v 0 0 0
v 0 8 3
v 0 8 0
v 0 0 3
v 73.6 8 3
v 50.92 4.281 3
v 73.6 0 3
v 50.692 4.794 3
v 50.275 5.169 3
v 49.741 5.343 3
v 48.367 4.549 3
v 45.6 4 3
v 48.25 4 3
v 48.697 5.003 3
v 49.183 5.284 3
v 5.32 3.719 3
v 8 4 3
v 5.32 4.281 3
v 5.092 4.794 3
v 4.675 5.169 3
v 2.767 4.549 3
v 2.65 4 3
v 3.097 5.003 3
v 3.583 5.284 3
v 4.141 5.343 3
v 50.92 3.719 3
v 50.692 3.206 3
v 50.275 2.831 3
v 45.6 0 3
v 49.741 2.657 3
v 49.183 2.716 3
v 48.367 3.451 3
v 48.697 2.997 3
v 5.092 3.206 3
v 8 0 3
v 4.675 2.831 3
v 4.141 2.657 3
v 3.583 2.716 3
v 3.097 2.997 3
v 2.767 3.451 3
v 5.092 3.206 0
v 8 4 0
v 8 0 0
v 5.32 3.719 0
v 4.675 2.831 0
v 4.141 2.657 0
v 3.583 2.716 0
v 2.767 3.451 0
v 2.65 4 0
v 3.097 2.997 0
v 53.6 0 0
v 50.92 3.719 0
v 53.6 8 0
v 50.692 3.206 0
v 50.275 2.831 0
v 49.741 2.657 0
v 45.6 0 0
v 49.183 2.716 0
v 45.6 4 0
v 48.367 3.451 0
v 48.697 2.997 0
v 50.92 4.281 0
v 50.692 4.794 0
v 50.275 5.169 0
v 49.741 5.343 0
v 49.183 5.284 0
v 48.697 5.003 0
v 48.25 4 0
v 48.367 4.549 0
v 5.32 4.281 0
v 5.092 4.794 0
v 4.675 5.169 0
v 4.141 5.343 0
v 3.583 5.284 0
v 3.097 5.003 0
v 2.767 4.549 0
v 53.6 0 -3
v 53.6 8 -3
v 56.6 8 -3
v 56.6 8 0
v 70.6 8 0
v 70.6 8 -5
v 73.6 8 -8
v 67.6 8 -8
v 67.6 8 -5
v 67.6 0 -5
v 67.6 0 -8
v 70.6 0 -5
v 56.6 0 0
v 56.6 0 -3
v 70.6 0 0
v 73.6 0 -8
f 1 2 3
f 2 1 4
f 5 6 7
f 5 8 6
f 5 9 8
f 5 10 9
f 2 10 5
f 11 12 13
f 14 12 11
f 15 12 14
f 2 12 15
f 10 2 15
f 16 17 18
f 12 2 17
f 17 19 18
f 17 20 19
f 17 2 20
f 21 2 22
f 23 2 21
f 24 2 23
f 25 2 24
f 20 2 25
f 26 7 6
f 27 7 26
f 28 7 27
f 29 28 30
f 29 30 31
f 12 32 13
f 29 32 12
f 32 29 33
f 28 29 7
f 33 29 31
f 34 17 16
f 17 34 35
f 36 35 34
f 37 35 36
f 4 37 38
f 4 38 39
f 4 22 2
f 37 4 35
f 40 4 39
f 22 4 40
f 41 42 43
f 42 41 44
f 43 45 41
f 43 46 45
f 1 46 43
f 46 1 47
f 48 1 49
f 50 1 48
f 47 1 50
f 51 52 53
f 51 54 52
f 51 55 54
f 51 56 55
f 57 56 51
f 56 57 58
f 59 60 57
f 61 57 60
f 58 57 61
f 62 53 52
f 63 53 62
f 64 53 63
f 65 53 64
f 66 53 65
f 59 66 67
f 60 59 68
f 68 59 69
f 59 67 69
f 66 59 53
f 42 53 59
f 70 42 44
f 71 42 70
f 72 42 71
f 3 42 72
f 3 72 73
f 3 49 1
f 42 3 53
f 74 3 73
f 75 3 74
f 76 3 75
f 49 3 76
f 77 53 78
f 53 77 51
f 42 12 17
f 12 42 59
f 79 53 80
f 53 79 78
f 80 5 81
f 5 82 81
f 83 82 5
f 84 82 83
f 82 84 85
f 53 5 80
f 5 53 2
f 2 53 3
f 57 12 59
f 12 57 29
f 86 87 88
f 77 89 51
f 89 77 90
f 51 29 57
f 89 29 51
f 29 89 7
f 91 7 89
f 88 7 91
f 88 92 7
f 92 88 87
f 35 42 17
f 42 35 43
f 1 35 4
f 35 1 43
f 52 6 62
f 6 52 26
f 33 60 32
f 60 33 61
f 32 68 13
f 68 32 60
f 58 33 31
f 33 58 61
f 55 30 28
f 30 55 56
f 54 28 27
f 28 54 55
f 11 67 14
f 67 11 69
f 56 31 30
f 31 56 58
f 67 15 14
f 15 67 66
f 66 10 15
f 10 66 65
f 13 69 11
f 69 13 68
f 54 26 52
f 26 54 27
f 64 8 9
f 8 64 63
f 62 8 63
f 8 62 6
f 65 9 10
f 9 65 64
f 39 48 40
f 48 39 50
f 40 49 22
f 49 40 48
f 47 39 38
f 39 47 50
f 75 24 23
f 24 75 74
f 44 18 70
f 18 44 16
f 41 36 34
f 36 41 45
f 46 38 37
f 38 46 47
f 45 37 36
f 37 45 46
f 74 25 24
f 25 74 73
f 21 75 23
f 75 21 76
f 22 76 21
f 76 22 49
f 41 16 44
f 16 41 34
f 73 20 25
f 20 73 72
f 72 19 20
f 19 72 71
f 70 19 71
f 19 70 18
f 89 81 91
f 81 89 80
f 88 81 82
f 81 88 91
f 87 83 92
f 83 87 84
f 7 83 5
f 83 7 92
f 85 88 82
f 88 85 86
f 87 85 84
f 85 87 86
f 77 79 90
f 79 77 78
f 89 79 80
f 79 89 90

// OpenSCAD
bodyHeight = 8;
wallSize = 3;
lipSize = 3;
fullSize = 20;
gap = 5;

$fn = 15;

// -----------------------------------------------------------

module holder() {
    // lower body
    cube([wallSize, fullSize - wallSize, bodyHeight]);

    // upper border
    translate([0, fullSize - wallSize, 0])
        cube([(2 * wallSize) + gap, wallSize, bodyHeight]);

    // upper lip
    translate([wallSize + gap, fullSize - (2 * wallSize), 0])
        cube([wallSize, wallSize, bodyHeight]);

    // lower border
    translate([wallSize, 0, 0])
        cube([lipSize, lipSize, bodyHeight]);
}

module holes() {
    cylinder(d = 2.7, h = wallSize + 2);
    translate([45.6, 0, 0])
        cylinder(d = 2.7, h = wallSize + 2);
}

module mount() {
    difference() {
        union() {
            cube([45.6 + (2 * 4), 4, wallSize]);
            
            cube([8, 8, wallSize]);
            
            translate([45.6 + (2 * 4) - 8, 0, 0])
                cube([8, 8, wallSize]);
        }
        
        translate([4, 2.65 + 1.35, -1])
            holes();
    }
}

module mountA() {
    mount();

    translate([45.6 + (2 * 4), bodyHeight, wallSize])
        rotate([90, 90, 0])
        holder();
}

module mountB() {
    translate([45.6 + (2 * 4), bodyHeight, 0])
        rotate([0, 0, 180])
        mount();

    translate([45.6 + (2 * 4), bodyHeight, wallSize])
        rotate([90, 90, 0])
        holder();
}

mountB();

/*
rotate([90, 0, 0])
    mountA();

translate([0, 20, bodyHeight])
    rotate([-90, 0, 0])
    mountB();
*/
